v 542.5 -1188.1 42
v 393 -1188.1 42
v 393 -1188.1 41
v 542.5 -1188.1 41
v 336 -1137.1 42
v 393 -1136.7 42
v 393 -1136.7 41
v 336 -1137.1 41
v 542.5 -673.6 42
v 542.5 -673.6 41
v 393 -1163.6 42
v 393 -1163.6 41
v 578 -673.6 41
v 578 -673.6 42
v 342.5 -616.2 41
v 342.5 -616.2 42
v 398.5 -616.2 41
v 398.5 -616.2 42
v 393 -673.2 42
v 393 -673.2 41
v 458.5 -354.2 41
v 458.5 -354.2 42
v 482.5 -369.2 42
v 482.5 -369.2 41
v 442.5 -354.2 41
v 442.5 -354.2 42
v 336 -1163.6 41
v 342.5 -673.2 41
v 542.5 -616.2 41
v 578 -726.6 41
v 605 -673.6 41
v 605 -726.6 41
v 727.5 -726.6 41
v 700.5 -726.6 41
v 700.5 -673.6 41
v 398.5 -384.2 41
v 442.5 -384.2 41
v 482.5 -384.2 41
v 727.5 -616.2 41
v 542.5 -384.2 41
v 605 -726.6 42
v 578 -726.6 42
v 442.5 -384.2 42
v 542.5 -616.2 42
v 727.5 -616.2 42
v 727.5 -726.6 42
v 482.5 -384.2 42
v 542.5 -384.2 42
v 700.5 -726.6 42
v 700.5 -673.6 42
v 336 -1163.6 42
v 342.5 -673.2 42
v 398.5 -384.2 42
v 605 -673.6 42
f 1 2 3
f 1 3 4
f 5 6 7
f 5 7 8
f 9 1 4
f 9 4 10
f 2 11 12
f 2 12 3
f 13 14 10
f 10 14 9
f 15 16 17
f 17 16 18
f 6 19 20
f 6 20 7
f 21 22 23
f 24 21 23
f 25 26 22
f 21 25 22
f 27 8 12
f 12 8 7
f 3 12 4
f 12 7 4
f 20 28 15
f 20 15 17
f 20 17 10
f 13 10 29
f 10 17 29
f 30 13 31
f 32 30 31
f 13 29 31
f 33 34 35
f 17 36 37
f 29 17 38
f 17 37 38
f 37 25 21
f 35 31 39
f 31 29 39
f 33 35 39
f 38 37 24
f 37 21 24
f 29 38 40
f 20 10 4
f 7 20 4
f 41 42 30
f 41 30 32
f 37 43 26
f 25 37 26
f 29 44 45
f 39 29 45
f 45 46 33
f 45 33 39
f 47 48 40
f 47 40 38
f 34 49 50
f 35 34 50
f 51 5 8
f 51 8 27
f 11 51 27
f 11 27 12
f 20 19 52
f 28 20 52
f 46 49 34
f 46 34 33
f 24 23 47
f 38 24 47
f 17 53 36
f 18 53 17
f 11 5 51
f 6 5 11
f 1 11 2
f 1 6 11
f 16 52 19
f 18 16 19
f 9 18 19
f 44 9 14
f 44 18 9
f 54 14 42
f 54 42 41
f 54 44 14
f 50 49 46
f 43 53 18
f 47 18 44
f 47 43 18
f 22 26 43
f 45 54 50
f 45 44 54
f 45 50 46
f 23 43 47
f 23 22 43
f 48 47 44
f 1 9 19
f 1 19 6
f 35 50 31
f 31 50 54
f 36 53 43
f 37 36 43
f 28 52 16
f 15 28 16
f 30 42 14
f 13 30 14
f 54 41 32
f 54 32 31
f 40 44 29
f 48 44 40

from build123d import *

# Parameters (mm, degrees)
SKETCH_1_W      = 16
SKETCH_1_H      = 30
SKETCH_1_W_2    = 27
SKETCH_1_H_2    = 53
SKETCH_1_W_3    = 60
SKETCH_1_H_3    = 55
SKETCH_1_H_4    = 57.5
SKETCH_1_H_5    = 117
SKETCH_1_H_6    = 117.5
SKETCH_1_W_4    = 125.5
SKETCH_1_H_7    = 60.4
SKETCH_1_H_8    = 230.9
EXTRUDE_1_DEPTH = 1
SKETCH_2_W      = 16
SKETCH_2_H      = 30
EXTRUDE_2_DEPTH = 10


with BuildPart() as part:
    # 草图1 → 拉伸1 (new body)
    with BuildSketch(Plane.XY.offset(42)):
        with Locations((450.5, -369.2)):
            Rectangle(SKETCH_1_W, SKETCH_1_H)
        Polygon((384.5, -354.2), (384.5, -384.2), (398.5, -384.2), (400.5, -384.2), (400.5, -354.2), align=None)
        with Locations((714, -700.1)):
            Rectangle(SKETCH_1_W_2, SKETCH_1_H_2)
        with Locations((591.5, -700.1)):
            Rectangle(SKETCH_1_W_2, SKETCH_1_H_2)
        Polygon((501.5, -423.1), (482.5, -423.1), (482.5, -443.7), (542.5, -443.7), (542.5, -413.6), (501.5, -413.6), align=None)
        Polygon((482.5, -410.1), (501.5, -410.1), (501.5, -413.6), (542.5, -413.6), (542.5, -384.2), (482.5, -384.2), align=None)
        with Locations((512.5, -471.2)):
            Rectangle(SKETCH_1_W_3, SKETCH_1_H_3)
        with Locations((428.5, -470.45)):
            Rectangle(SKETCH_1_W_3, SKETCH_1_H_4)
        Polygon((398.5, -384.2), (400.5, -384.2), (442.5, -384.2), (458.5, -384.2), (458.5, -441.7), (398.5, -441.7), align=None)
        with Locations((428.5, -557.7)):
            Rectangle(SKETCH_1_W_3, SKETCH_1_H_5)
        with Locations((512.5, -557.45)):
            Rectangle(SKETCH_1_W_3, SKETCH_1_H_6)
        with Locations((479.75, -1157.9)):
            Rectangle(SKETCH_1_W_4, SKETCH_1_H_7)
        Polygon((417, -896.8), (542.5, -896.8), (542.5, -786.2), (417.295919732, -786.2), align=None)
        Polygon((417.295919732, -786.2), (417.598084778, -673.265814274), (393, -673.2), (393, -1136.7), (336, -1137.1), (336, -1163.6), (393, -1163.6), (393, -1188.1), (417, -1188.1), (417, -1127.7), (417, -896.8), align=None)
        Polygon((542.5, -786.2), (542.5, -673.6), (417.598084778, -673.265814274), (417.295919732, -786.2), align=None)
        with Locations((479.75, -1012.25)):
            Rectangle(SKETCH_1_W_4, SKETCH_1_H_8)
        Polygon((393, -673.2), (342.5, -673.2), (342.5, -616.2), (398.5, -616.2), (458.5, -616.2), (458.5, -499.2), (458.5, -441.7), (458.5, -384.2), (458.5, -354.2), (482.5, -369.2), (482.5, -384.2), (482.5, -410.1), (501.5, -410.1), (501.5, -413.6), (501.5, -423.1), (482.5, -423.1), (482.5, -443.7), (482.5, -498.7), (482.5, -616.2), (542.5, -616.2), (727.5, -616.2), (727.5, -673.6), (700.5, -673.6), (605, -673.6), (578, -673.6), (542.5, -673.6), (417.598084778, -673.265814274), align=None)
    extrude(amount=-EXTRUDE_1_DEPTH)

    # 草图2 → 拉伸2 (cut)
    with BuildSketch(Plane.XY.offset(42)):
        with Locations((392.5, -369.2)):
            Rectangle(SKETCH_2_W, SKETCH_2_H)
    extrude(amount=-EXTRUDE_2_DEPTH, mode=Mode.SUBTRACT)


solid = part.part
